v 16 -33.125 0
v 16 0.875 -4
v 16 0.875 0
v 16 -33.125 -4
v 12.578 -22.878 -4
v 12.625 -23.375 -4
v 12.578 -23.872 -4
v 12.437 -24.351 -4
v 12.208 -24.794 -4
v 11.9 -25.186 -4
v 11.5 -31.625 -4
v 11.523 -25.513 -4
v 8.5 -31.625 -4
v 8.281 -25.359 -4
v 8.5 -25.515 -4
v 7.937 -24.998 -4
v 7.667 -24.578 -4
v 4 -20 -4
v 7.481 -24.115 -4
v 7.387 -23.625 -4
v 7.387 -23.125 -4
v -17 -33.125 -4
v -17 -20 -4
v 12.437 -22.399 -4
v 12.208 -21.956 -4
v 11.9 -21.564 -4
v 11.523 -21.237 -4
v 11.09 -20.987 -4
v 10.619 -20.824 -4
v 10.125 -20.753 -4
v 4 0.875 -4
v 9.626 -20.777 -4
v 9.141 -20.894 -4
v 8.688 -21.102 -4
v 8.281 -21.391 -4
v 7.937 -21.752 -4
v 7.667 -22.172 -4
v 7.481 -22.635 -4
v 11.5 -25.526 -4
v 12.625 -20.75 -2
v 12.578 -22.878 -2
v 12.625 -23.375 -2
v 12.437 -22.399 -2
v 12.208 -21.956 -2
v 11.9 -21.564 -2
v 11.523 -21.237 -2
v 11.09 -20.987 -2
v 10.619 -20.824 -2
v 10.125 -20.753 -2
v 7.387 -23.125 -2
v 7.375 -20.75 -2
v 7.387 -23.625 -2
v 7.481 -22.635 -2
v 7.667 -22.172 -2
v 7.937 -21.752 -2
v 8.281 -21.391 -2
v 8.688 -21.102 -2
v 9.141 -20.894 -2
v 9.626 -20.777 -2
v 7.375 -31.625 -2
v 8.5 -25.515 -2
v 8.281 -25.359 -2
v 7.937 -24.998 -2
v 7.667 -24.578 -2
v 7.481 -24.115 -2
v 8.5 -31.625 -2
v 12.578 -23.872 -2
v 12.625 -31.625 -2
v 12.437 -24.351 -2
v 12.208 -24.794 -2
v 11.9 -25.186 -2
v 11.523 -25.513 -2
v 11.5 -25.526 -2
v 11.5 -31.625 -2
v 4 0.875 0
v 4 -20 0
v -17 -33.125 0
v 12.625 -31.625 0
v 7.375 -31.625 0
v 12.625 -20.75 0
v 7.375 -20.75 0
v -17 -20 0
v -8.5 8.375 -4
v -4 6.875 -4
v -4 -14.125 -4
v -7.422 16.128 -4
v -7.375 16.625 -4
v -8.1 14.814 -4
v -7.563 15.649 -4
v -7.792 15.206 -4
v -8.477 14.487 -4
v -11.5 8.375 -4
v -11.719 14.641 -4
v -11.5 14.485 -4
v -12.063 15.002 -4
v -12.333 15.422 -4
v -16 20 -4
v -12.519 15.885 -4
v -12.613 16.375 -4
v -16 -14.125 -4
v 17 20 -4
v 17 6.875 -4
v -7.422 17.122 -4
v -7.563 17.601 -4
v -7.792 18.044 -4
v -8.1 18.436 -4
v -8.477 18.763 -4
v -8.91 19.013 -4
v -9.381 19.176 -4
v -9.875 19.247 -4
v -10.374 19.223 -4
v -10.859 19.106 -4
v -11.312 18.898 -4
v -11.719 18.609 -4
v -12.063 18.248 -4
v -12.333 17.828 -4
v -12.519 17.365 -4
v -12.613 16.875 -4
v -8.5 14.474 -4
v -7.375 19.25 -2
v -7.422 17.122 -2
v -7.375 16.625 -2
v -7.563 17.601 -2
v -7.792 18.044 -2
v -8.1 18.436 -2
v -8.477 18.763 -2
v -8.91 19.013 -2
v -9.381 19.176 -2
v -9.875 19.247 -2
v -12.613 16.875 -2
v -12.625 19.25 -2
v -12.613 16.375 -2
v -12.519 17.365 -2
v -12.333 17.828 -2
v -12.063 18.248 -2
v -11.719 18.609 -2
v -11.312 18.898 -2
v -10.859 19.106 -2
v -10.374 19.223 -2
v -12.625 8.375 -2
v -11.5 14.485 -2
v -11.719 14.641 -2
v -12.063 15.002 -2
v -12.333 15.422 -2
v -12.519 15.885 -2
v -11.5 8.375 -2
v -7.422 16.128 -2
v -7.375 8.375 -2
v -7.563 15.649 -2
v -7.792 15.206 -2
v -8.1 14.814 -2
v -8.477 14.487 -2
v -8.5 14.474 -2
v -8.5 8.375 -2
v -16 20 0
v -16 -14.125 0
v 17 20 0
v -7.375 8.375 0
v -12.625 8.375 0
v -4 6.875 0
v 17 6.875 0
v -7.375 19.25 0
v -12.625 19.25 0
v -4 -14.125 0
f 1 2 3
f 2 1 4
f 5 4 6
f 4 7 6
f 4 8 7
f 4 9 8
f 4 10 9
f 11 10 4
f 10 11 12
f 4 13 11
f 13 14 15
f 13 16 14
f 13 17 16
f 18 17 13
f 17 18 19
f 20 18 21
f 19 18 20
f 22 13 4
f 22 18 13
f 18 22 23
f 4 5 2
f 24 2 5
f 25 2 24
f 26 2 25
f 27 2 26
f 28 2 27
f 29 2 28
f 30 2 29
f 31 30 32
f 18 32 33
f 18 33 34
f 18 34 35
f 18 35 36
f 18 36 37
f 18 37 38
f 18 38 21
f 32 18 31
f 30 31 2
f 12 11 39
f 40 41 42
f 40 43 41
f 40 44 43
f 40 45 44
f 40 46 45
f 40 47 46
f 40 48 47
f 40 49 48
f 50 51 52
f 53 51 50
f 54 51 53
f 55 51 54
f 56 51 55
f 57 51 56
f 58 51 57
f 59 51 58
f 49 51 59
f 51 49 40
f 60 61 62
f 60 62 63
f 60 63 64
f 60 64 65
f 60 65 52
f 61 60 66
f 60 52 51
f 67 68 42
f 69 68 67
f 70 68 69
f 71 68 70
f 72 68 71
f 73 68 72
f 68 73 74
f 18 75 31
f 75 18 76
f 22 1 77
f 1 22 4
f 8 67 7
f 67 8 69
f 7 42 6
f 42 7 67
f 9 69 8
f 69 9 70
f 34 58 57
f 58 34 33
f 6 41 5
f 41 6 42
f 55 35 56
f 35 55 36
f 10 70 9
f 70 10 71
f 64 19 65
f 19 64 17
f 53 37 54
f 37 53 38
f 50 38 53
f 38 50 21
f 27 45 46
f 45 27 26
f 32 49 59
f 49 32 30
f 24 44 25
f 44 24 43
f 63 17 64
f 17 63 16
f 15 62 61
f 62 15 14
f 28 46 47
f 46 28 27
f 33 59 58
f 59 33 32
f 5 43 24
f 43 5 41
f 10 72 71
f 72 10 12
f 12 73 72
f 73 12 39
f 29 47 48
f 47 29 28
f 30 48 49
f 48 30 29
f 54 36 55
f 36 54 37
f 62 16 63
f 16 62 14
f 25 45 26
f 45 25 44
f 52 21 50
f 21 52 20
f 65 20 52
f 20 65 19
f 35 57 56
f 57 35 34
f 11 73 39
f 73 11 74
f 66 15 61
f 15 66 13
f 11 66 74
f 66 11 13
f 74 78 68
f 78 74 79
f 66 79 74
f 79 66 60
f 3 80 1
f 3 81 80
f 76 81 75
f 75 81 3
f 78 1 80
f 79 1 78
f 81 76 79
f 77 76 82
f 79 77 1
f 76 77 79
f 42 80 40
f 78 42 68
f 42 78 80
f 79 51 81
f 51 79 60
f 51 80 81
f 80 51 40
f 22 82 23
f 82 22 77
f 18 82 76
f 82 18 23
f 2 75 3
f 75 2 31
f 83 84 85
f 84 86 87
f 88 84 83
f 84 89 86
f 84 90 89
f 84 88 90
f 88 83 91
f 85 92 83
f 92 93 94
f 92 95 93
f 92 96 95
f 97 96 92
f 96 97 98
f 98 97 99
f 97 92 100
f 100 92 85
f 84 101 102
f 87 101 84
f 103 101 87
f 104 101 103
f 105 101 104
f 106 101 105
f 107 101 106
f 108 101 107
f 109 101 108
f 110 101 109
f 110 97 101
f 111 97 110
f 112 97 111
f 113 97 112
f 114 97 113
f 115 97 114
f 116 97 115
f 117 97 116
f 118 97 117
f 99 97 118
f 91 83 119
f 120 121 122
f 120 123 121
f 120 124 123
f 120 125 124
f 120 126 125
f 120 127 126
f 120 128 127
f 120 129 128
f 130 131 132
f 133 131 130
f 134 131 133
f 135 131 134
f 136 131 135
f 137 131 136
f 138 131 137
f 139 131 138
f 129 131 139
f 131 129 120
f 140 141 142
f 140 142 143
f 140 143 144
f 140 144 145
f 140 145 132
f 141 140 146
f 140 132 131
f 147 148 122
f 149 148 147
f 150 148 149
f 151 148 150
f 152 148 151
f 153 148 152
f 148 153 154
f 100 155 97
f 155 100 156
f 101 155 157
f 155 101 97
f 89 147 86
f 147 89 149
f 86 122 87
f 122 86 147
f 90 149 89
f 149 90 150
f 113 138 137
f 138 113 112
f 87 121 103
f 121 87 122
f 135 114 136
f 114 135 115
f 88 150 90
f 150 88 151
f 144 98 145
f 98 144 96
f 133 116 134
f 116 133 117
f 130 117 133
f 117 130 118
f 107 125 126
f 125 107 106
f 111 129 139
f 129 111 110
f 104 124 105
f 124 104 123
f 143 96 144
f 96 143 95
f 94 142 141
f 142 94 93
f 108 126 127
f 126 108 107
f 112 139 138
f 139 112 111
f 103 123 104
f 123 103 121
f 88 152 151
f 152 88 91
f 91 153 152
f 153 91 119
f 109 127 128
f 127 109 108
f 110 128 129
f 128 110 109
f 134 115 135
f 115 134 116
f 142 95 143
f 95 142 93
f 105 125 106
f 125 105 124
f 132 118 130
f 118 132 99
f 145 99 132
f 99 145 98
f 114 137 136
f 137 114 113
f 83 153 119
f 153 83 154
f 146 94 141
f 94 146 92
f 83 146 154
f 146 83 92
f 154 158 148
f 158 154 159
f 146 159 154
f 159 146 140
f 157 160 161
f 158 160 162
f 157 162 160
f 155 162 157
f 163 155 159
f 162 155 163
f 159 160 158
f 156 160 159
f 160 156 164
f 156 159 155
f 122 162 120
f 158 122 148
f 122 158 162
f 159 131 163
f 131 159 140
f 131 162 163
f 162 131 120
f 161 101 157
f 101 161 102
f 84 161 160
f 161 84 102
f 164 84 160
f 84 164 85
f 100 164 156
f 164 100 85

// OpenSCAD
// screw head dia = 5.20 mm
// screw head height = 2.0 mm
// screw thread dia 3.0mm

$fs = 0.5;
$fa = 2;


screw_head_height=2;
groove_catch_height=2;
groove_travel_height=2;
screw_head_dia = 5.25;

length=2.5*screw_head_dia;


module top( width = 12, length = length, height = 2) {
  difference() {
    translate([0-(.5*width),0,0]) cube([width,length,height],false);
    translate([0,.75+(.5*screw_head_dia),0]) cylinder(d=screw_head_dia,h=height);
    translate([0-.5*3,screw_head_dia,0]) cube([3,length-.75-screw_head_dia-.75,height]);
  }
}

module bottom( width = 12, length = length, height = 2) {
  difference() {
    translate([0-(.5*width),0,0]) cube([width,length,height],false);
    translate([0-.5*screw_head_dia,.75,0]) cube([screw_head_dia,length-.75-.75-.75,height]);
  }
}

module foot() {
  union() {
    color("green") translate([0,0,2]) top();
    color("red") bottom();
  }
}

module left() {
  union() {
    foot();
    color("blue")   translate([screw_head_dia+.75,0,0]) cube([4*screw_head_dia,2.5*screw_head_dia,4]);
    color("yellow") translate([-6.0,length,0])          cube([12,4*screw_head_dia,4]);
  }
}

module right() {
  union() {
    foot();
    color("blue")   translate([0-(5*screw_head_dia)-.75,0,0]) cube([4*screw_head_dia,2.5*screw_head_dia,4]);
    color("yellow") translate([-6.0,0-length-screw_head_dia-2.5,0])          cube([12,4*screw_head_dia,4]);
  }
}
module main() {
  color("red") translate([10,20,0]) right();
  color("blue") translate([-10,-20,0]) left();
}

 rotate([180,0,0])
main();
